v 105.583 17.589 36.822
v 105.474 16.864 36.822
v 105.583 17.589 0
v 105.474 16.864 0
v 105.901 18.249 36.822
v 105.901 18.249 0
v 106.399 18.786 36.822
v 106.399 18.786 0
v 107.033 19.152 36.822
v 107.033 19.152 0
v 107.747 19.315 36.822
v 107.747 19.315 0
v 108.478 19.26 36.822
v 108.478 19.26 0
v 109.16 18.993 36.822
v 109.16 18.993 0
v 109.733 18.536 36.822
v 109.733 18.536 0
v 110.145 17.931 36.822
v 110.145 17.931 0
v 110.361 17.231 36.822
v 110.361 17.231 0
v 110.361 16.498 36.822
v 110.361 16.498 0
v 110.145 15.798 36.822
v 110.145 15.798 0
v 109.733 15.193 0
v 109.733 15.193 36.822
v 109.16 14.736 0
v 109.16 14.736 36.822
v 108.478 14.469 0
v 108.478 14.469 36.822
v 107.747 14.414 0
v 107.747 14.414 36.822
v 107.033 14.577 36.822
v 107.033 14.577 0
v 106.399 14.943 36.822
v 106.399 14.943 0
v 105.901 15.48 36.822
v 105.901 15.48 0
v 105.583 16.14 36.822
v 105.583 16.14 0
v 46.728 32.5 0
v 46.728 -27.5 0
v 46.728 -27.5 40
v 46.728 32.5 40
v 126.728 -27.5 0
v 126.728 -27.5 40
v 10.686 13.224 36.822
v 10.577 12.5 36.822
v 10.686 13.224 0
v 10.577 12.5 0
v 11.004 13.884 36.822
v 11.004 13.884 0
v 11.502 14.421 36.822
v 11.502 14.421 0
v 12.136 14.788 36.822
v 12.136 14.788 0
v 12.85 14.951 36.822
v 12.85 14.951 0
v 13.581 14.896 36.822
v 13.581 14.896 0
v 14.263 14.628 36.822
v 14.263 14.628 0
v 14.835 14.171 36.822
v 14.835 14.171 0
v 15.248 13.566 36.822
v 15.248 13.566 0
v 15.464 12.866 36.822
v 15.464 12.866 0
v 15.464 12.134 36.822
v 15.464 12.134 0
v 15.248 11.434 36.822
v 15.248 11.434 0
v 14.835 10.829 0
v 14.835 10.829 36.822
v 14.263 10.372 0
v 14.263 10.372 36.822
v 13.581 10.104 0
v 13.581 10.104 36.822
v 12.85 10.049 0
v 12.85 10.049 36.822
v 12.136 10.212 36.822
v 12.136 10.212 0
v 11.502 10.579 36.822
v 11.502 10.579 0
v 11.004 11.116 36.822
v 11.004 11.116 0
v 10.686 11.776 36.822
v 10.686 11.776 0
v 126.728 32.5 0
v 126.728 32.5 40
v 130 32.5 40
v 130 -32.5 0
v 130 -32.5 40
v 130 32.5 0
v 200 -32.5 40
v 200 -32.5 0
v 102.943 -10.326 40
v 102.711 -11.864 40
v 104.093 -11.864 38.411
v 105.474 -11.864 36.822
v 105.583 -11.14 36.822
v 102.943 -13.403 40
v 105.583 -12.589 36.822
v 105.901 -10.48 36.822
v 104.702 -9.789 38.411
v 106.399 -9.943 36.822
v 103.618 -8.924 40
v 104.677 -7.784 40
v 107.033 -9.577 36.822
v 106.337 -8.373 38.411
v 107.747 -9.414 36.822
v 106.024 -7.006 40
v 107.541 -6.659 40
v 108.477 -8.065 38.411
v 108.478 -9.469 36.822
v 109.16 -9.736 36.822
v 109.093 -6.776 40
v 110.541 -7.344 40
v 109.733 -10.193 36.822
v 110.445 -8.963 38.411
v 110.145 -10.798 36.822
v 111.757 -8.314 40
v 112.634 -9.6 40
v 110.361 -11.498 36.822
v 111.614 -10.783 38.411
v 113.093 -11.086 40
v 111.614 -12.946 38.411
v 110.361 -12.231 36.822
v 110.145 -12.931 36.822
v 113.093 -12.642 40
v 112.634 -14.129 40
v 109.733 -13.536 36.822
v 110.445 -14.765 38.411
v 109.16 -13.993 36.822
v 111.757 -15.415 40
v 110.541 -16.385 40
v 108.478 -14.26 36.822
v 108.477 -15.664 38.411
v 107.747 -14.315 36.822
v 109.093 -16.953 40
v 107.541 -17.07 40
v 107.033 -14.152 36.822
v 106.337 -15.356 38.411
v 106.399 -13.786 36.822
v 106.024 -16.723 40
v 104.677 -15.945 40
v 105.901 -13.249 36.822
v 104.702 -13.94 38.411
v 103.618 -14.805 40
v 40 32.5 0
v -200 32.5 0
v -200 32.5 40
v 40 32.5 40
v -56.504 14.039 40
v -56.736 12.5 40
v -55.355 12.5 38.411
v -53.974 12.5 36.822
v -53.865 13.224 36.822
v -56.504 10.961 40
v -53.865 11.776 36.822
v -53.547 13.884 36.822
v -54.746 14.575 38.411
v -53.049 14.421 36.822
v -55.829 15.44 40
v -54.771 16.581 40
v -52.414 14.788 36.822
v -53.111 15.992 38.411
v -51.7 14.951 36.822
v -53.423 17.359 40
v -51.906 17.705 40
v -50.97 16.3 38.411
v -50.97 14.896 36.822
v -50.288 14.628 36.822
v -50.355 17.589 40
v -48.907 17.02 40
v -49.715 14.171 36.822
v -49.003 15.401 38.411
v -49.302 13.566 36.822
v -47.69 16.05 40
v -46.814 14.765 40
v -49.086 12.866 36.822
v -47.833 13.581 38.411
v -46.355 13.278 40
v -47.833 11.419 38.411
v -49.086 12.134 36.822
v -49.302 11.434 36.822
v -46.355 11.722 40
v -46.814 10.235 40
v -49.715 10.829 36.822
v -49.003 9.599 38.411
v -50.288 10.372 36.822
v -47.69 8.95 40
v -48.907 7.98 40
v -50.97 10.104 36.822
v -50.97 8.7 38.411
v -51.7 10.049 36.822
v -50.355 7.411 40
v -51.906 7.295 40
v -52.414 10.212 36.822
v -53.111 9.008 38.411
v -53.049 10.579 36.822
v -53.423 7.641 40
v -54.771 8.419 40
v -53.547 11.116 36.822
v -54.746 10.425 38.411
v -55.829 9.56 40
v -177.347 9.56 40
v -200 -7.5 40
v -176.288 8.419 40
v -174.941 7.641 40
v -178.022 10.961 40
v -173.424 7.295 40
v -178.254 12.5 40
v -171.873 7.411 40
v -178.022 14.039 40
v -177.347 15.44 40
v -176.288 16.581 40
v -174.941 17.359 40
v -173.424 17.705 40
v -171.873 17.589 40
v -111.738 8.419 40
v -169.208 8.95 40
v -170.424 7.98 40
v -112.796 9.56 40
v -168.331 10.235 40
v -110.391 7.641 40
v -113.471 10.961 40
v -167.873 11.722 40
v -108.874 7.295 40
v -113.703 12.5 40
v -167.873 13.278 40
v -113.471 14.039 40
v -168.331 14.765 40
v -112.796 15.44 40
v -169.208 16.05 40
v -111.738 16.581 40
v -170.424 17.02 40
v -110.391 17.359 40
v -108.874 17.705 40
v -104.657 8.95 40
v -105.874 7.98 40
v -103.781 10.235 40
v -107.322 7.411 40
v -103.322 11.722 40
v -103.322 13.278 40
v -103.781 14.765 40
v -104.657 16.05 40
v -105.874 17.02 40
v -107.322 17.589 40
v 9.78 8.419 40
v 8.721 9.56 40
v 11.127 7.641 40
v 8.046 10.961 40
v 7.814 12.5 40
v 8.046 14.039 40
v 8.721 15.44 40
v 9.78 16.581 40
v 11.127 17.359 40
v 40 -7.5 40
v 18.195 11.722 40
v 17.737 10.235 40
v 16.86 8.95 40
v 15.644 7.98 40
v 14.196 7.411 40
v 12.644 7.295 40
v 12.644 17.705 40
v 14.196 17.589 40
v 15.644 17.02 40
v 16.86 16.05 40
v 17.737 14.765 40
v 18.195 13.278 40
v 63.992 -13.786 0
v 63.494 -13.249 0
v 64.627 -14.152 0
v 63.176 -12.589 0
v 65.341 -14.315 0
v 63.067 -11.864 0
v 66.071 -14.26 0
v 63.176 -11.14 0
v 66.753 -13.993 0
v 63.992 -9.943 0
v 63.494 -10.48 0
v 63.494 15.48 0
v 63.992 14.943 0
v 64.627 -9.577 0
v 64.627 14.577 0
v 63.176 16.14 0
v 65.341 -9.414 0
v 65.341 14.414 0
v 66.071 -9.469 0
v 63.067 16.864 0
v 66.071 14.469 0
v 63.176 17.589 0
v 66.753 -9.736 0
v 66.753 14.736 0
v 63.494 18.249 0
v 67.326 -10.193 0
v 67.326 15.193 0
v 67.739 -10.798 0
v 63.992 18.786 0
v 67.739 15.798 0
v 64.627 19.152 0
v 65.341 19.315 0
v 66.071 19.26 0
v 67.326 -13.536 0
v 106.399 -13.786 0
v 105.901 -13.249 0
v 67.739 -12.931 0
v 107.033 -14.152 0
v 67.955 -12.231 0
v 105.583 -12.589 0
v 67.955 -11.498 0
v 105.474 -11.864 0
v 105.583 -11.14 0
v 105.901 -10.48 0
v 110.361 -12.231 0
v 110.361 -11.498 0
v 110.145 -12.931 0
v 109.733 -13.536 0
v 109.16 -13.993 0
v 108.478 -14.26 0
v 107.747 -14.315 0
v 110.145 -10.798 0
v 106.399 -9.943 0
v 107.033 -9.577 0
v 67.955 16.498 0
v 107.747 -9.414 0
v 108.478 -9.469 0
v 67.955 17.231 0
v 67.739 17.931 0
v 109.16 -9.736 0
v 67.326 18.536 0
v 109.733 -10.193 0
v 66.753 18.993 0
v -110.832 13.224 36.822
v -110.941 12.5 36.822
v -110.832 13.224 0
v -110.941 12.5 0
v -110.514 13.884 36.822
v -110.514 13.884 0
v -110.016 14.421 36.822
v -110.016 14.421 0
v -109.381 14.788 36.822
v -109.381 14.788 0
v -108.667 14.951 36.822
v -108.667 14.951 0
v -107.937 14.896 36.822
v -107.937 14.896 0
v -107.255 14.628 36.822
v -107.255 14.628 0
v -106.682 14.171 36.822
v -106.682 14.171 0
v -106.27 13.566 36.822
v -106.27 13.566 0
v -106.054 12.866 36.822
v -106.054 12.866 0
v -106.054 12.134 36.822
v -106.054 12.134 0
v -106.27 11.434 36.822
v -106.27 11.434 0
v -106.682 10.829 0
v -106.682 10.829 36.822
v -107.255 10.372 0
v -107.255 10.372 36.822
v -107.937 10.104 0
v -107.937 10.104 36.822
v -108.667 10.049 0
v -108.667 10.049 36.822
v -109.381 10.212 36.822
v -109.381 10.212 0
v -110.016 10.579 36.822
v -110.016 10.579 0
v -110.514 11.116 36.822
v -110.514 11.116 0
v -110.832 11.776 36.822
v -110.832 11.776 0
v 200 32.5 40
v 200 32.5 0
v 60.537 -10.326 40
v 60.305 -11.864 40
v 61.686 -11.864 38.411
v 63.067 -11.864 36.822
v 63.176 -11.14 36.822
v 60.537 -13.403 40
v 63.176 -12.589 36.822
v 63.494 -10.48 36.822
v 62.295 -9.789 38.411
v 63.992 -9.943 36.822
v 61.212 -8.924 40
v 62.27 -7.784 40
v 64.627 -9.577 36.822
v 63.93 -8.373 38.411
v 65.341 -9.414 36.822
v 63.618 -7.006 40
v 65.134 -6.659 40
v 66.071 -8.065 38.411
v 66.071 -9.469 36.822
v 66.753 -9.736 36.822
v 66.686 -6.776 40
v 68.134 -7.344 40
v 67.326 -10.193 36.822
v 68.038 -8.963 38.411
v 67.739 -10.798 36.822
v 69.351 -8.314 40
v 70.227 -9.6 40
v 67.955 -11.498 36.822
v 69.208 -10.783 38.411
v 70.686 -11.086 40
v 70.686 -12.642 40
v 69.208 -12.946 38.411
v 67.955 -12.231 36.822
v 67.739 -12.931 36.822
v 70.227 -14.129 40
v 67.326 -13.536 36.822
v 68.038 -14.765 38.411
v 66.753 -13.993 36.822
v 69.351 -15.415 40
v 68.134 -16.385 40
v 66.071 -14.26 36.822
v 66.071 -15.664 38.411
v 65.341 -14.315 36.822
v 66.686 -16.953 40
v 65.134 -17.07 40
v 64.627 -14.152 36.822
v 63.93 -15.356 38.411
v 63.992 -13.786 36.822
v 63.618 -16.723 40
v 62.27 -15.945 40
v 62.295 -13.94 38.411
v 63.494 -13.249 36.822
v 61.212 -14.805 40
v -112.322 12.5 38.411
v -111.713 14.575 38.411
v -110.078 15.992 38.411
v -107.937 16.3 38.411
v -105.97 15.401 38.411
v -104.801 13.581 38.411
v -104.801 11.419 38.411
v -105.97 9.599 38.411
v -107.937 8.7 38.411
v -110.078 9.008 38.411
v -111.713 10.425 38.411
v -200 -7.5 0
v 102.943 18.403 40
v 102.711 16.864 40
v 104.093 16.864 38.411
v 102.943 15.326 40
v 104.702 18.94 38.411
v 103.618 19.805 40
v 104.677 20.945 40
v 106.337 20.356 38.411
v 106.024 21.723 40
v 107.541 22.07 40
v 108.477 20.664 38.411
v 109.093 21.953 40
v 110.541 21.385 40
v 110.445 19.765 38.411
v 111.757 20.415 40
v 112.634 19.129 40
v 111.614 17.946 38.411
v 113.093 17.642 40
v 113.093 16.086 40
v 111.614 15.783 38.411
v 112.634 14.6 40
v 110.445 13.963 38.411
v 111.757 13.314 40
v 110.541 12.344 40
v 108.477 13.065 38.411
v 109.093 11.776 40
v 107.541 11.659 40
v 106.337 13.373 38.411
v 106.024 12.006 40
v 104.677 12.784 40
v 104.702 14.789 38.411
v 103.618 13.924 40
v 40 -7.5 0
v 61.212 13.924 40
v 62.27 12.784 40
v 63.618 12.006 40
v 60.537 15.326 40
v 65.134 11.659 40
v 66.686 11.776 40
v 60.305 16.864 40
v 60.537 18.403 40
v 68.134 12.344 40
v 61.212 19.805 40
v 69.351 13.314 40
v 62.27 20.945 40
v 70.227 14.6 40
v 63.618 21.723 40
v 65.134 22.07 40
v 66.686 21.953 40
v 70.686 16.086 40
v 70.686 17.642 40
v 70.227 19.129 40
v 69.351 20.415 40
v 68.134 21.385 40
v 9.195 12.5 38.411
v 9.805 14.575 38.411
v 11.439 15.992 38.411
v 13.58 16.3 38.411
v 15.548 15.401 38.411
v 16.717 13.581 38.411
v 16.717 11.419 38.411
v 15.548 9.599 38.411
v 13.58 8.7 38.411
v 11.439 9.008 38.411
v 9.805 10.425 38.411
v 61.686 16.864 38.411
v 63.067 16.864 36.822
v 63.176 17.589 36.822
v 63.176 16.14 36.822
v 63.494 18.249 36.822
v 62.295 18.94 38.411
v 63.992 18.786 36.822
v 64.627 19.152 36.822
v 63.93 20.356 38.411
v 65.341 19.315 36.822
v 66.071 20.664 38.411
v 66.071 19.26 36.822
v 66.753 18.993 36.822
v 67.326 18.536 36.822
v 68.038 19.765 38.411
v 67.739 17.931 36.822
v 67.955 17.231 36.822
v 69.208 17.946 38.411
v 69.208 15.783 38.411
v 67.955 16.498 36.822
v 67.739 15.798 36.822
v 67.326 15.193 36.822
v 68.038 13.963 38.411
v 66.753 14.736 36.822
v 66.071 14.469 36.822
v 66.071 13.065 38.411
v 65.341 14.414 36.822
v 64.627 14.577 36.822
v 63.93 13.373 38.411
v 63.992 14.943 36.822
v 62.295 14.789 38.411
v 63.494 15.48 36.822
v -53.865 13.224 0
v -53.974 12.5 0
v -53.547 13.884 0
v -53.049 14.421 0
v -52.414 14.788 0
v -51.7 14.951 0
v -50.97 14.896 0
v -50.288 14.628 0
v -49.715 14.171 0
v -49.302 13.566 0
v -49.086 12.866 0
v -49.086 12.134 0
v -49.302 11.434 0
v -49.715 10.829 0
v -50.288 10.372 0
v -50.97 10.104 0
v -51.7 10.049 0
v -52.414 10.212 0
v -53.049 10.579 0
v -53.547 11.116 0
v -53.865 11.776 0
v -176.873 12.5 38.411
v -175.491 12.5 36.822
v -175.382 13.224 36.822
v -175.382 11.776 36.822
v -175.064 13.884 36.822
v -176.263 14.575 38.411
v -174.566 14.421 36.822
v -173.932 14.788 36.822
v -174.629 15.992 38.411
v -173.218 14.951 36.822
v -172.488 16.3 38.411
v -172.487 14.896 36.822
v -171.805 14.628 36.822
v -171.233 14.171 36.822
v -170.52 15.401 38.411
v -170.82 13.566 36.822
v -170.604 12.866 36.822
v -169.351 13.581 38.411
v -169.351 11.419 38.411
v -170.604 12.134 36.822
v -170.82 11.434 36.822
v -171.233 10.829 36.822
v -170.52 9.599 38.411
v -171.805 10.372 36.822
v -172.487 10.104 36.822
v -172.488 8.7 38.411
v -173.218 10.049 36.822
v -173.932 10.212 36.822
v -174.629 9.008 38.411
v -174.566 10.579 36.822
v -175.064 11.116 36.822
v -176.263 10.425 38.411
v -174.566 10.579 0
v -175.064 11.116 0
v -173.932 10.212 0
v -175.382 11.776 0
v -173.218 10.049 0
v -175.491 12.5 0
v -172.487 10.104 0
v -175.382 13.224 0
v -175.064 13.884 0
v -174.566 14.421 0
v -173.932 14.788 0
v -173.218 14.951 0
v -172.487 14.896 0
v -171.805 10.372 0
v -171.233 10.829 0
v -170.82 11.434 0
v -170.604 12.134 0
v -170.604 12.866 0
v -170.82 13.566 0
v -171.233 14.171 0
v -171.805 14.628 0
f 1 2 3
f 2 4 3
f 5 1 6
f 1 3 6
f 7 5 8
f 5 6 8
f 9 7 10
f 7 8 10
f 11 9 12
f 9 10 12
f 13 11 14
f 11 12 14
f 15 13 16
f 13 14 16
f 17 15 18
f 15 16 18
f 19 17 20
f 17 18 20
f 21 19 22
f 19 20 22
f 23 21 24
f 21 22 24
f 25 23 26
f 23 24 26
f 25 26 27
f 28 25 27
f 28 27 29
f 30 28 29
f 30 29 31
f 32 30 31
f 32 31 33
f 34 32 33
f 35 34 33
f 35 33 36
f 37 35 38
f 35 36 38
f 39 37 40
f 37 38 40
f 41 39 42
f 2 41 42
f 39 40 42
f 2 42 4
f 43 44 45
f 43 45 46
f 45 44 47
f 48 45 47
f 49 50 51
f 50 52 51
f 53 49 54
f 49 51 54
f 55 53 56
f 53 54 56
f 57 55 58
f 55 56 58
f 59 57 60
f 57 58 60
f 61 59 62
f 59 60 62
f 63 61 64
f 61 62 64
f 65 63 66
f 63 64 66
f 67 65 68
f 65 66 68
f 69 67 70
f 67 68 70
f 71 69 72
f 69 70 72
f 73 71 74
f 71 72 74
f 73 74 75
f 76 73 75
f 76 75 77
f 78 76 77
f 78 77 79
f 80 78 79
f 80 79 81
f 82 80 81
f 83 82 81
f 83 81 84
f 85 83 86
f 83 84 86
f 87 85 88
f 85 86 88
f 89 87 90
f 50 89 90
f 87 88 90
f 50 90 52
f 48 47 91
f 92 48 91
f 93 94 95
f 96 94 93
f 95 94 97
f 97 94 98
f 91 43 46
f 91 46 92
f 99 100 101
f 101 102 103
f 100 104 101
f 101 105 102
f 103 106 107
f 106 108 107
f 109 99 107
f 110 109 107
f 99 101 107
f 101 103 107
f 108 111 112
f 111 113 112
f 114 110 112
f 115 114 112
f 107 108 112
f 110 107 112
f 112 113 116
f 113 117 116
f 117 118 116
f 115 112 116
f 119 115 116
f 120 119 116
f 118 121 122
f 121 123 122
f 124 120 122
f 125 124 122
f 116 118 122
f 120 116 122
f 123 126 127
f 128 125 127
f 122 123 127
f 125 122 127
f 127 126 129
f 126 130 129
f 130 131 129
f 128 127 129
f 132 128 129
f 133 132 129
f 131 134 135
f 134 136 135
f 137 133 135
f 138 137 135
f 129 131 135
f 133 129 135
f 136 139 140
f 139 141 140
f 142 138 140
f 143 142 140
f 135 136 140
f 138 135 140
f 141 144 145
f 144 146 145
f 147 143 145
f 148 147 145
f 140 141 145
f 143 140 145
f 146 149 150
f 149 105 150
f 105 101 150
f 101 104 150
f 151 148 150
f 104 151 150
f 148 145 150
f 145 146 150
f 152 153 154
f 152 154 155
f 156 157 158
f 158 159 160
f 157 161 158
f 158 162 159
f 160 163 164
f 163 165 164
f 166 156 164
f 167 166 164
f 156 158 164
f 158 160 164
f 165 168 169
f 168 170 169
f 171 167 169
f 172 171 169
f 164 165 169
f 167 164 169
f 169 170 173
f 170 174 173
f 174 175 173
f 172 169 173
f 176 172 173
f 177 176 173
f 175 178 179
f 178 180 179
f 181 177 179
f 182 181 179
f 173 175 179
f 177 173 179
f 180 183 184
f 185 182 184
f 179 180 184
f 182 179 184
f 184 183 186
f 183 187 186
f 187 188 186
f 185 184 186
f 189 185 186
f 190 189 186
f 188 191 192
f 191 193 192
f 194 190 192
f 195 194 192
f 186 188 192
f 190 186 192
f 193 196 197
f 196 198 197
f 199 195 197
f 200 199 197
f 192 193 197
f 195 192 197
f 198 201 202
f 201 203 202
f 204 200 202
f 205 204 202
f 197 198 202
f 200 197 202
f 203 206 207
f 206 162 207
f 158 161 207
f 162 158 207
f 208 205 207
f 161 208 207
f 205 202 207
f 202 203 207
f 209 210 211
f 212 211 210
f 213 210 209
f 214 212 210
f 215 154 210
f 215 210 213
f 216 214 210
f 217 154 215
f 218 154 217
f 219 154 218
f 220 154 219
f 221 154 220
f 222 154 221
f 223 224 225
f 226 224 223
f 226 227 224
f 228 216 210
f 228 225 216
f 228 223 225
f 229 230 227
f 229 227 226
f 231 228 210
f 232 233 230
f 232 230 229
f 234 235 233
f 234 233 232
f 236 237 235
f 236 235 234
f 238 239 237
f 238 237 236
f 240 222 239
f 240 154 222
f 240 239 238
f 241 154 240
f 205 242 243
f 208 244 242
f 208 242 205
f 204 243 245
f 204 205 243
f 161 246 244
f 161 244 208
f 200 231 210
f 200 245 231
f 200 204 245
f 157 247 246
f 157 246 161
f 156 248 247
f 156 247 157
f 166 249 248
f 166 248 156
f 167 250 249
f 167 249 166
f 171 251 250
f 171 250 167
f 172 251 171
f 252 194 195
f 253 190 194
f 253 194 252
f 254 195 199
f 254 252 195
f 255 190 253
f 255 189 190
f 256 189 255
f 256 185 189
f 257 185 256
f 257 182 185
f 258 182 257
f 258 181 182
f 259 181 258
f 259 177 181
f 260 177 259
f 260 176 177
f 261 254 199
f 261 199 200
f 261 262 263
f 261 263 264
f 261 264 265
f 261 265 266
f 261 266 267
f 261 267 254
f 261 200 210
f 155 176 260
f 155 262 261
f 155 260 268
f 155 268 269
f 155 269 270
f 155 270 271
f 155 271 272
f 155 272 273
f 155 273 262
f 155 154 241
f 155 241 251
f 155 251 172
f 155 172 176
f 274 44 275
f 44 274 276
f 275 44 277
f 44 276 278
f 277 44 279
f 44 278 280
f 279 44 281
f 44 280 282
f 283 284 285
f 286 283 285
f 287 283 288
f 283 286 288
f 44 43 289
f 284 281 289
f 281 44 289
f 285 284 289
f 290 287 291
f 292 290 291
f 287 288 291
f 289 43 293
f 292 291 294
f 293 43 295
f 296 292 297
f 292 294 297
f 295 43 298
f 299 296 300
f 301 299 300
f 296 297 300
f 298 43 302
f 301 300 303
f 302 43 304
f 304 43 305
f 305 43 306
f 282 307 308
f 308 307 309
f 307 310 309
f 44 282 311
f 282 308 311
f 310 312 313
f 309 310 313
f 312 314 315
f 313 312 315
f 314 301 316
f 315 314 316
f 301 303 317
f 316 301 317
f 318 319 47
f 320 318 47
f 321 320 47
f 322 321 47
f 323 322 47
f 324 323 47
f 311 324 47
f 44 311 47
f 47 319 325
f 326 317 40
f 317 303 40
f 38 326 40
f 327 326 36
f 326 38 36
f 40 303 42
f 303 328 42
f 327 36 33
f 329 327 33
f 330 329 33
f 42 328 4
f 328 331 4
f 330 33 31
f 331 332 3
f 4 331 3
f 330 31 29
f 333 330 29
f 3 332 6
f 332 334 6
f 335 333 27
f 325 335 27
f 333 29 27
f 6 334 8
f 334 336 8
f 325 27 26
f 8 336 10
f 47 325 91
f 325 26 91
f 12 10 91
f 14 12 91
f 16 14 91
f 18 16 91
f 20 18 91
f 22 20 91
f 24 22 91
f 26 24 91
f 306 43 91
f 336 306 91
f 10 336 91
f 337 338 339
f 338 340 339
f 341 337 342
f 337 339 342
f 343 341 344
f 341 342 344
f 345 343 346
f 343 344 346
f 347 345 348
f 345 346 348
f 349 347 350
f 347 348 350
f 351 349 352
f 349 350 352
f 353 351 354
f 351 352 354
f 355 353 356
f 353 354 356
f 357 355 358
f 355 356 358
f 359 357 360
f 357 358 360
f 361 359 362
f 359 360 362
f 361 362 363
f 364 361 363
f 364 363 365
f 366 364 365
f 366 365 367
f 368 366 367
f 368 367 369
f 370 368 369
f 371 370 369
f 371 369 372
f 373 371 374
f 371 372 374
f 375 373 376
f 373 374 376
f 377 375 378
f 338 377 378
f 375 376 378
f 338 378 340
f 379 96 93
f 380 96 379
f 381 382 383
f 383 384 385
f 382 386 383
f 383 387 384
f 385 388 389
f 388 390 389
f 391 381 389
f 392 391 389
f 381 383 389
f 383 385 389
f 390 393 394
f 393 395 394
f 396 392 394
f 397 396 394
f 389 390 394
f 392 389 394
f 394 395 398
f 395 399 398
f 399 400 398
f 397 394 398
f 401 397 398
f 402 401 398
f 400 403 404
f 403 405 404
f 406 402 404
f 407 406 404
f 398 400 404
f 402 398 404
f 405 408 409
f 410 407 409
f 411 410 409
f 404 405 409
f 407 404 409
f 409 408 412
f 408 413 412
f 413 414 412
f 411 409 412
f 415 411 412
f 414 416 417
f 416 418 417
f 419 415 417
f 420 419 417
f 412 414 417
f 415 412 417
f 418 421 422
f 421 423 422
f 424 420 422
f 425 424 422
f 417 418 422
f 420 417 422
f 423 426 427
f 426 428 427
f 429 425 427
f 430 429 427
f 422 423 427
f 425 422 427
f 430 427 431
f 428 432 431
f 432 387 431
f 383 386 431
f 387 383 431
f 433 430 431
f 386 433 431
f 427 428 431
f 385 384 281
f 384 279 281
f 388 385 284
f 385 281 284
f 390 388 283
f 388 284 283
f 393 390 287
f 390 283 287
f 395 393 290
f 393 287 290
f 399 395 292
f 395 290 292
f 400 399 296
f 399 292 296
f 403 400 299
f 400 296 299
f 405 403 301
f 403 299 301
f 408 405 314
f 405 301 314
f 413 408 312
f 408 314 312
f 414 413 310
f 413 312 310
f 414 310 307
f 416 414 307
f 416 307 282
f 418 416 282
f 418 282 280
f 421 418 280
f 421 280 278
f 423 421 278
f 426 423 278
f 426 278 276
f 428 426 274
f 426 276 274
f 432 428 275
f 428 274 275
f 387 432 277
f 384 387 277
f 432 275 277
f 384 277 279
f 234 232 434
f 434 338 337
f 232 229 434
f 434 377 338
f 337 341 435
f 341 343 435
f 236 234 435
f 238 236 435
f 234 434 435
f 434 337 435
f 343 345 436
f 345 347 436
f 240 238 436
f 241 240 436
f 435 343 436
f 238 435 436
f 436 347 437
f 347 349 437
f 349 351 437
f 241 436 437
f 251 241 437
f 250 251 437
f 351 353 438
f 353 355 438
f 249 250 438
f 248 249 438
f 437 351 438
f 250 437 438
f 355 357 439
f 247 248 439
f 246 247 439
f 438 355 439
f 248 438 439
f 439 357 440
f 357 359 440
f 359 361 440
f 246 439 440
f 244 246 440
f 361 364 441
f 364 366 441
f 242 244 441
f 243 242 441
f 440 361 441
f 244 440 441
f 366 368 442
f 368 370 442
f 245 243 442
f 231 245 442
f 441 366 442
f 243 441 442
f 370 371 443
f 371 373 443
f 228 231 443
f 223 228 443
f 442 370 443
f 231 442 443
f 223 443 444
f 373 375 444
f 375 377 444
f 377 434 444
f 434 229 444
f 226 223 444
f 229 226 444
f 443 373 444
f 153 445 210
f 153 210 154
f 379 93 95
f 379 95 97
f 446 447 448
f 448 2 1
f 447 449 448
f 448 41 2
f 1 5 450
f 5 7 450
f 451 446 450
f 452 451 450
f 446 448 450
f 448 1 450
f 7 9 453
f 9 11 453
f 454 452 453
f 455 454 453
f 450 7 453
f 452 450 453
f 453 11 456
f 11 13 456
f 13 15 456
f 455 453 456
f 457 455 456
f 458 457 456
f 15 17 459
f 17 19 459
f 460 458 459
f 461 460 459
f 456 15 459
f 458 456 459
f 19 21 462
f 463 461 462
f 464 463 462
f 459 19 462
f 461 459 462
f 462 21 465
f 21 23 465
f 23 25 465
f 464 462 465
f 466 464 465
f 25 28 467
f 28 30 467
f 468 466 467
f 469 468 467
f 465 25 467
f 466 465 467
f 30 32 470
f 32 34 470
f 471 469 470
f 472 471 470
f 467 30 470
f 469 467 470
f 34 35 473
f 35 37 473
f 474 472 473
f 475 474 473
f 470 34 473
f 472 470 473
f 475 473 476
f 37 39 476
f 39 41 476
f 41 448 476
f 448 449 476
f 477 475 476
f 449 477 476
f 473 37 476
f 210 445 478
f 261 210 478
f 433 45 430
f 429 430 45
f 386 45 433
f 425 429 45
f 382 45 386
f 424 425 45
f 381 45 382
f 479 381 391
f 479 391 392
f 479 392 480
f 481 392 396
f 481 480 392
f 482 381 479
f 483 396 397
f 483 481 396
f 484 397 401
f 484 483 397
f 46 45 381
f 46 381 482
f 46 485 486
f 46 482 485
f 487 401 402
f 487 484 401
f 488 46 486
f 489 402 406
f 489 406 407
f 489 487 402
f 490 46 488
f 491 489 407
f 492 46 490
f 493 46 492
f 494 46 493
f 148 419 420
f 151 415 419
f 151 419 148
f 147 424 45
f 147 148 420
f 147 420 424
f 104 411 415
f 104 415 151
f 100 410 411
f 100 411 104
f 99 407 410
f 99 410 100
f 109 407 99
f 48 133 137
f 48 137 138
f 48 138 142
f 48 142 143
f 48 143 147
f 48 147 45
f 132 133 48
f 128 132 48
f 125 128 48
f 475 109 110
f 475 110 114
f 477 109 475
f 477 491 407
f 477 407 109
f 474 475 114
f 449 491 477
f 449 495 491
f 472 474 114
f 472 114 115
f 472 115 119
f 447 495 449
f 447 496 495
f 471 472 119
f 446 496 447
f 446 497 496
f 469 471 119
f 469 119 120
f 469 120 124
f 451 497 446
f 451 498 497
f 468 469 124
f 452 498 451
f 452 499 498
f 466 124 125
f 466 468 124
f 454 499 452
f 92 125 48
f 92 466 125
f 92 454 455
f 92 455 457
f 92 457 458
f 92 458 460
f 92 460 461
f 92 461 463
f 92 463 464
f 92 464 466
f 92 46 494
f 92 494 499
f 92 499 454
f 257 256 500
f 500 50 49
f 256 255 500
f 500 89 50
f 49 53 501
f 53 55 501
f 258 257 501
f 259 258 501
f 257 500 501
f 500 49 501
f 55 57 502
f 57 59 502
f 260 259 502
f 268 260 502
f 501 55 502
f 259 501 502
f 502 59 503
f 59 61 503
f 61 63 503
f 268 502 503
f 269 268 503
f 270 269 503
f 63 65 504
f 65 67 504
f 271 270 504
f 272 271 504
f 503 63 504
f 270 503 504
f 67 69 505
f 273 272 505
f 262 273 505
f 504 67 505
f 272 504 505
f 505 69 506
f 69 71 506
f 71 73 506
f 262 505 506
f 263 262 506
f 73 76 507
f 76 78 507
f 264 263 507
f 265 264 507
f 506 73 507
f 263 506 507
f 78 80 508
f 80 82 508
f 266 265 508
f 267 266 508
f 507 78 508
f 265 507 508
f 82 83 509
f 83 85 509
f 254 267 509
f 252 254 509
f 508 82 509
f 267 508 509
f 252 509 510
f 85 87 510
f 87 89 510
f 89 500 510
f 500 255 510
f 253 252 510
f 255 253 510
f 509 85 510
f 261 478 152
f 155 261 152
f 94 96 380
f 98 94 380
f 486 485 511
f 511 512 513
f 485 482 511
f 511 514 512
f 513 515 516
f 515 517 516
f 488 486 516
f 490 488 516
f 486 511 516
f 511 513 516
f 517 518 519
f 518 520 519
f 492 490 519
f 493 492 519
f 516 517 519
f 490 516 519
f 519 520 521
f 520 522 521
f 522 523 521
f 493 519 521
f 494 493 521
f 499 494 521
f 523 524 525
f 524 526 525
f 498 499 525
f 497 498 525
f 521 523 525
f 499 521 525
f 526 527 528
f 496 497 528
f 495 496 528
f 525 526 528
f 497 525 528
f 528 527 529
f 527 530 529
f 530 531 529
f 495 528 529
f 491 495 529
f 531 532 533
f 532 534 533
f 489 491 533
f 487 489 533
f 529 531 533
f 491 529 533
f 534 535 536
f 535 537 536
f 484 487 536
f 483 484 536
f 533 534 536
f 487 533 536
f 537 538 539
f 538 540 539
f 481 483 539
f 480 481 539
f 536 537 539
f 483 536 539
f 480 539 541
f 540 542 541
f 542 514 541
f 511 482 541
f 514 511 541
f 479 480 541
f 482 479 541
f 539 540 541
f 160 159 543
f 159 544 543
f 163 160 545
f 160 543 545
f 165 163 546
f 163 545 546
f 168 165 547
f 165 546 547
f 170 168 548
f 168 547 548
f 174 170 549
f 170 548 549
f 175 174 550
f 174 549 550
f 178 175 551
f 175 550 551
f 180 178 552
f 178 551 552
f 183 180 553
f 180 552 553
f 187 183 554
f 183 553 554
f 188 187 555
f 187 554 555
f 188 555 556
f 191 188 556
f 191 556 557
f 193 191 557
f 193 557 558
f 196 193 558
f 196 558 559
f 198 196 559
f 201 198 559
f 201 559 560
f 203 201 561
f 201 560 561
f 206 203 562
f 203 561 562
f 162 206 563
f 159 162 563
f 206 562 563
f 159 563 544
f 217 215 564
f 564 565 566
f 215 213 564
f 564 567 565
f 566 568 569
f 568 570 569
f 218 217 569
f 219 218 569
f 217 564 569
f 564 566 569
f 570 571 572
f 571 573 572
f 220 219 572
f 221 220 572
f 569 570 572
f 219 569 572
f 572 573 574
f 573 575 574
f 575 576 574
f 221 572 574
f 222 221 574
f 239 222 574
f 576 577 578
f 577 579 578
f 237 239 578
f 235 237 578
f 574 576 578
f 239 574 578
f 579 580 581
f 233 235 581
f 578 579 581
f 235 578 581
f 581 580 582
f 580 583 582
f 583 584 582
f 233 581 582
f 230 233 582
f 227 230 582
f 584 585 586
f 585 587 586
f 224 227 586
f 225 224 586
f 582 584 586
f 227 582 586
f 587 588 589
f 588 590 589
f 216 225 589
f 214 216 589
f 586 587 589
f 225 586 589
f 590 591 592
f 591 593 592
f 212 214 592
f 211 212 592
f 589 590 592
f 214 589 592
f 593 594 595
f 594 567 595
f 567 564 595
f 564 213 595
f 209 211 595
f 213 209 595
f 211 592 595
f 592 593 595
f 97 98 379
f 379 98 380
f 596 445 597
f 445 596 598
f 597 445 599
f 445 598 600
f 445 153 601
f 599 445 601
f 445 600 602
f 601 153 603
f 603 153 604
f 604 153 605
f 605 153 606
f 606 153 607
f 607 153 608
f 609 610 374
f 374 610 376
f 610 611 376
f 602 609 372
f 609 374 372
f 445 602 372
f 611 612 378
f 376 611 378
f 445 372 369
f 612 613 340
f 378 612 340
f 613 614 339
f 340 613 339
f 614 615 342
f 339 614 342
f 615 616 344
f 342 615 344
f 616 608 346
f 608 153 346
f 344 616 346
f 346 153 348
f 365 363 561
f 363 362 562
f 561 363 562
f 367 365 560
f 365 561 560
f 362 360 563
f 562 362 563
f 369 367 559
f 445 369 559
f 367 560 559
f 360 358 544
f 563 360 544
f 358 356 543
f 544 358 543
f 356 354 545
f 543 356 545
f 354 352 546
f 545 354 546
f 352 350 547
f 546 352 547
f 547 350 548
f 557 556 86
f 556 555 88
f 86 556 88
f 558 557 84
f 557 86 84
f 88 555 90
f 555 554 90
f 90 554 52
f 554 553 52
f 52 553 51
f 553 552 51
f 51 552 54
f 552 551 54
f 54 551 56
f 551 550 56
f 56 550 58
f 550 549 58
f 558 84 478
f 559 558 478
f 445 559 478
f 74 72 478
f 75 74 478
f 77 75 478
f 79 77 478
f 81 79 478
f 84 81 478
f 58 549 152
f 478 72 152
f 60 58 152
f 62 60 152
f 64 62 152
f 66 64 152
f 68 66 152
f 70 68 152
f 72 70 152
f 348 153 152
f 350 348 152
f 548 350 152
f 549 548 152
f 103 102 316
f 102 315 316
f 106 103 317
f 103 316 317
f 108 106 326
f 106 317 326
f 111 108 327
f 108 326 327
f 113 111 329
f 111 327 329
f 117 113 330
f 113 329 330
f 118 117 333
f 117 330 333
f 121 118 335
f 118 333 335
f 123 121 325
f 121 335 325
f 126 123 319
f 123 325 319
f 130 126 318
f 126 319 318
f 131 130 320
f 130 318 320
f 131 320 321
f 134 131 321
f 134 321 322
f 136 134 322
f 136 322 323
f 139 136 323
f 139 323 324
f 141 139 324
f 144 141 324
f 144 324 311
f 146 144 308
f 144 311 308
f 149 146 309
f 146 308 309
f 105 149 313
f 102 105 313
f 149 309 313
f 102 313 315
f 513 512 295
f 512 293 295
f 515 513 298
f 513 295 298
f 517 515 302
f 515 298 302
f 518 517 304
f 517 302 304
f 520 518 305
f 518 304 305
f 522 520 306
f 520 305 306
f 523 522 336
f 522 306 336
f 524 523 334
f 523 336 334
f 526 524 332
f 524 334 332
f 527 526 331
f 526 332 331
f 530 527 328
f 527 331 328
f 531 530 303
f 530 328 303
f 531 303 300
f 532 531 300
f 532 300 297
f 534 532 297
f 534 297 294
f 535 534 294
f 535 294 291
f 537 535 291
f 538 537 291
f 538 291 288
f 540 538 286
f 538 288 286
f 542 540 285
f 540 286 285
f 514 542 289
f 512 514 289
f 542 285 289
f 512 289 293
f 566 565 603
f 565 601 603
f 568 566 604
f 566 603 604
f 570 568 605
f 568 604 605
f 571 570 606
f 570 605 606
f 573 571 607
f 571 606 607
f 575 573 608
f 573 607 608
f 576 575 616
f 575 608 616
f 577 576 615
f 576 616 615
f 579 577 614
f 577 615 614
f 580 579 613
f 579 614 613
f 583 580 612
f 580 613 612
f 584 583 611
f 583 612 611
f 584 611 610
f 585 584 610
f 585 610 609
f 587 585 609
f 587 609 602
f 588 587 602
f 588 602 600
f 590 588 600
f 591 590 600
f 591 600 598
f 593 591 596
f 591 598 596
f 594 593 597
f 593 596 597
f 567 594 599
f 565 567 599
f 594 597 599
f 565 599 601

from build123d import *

# Parameters (mm, degrees)
F0_W             = 240
F0_H             = 40
F1_DEPTH         = 40
F0_W_2           = 80
F0_H_2           = 60
F0_W_3           = 70
F0_H_3           = 65
F3_D             = 4.9149
F3_CSINK_D       = 10.4394
F3_CSINK_ANGLE   = 82
F3_2_D           = 4.9149
F3_2_CSINK_D     = 10.4394
F3_2_CSINK_ANGLE = 82


with BuildPart() as f1:
    # F0 (on Top) → F1 (new body)
    with BuildSketch(Plane.XY):
        with Locations((-80, 12.5)):
            Rectangle(F0_W, F0_H)
    extrude(amount=F1_DEPTH)

    # F3 (through all)
    with Locations(Plane.XY.offset(40)):
        with Locations((65.5245407671, 16.8644282967), (107.9311296344, 16.8644282967), (107.9311296344, -11.8644282967), (65.5245407671, -11.8644282967), (-51.5163959959, 12.5), (13.03404212, 12.5), (-108.4836040041, 12.5), (-173.03404212, 12.5)):
            CounterSinkHole(F3_D / 2, F3_CSINK_D / 2, counter_sink_angle=F3_CSINK_ANGLE)


with BuildPart() as f1b:
    # F0 (on Top) → F1, piece 2 (new body)
    with BuildSketch(Plane.XY):
        with Locations((86.7278352007, 2.5)):
            Rectangle(F0_W_2, F0_H_2)
    extrude(amount=F1_DEPTH)

    # F3#2 (through all)
    with Locations(Plane.XY.offset(40)):
        with Locations((65.5245407671, 16.8644282967), (107.9311296344, 16.8644282967), (107.9311296344, -11.8644282967), (65.5245407671, -11.8644282967), (-51.5163959959, 12.5), (13.03404212, 12.5), (-108.4836040041, 12.5), (-173.03404212, 12.5)):
            CounterSinkHole(F3_2_D / 2, F3_2_CSINK_D / 2, counter_sink_angle=F3_2_CSINK_ANGLE)


with BuildPart() as f1c:
    # F0 (on Top) → F1, piece 3 (new body)
    with BuildSketch(Plane.XY):
        with Locations((165, 0)):
            Rectangle(F0_W_3, F0_H_3)
    extrude(amount=F1_DEPTH)


solid = Compound([f1.part, f1b.part, f1c.part])
